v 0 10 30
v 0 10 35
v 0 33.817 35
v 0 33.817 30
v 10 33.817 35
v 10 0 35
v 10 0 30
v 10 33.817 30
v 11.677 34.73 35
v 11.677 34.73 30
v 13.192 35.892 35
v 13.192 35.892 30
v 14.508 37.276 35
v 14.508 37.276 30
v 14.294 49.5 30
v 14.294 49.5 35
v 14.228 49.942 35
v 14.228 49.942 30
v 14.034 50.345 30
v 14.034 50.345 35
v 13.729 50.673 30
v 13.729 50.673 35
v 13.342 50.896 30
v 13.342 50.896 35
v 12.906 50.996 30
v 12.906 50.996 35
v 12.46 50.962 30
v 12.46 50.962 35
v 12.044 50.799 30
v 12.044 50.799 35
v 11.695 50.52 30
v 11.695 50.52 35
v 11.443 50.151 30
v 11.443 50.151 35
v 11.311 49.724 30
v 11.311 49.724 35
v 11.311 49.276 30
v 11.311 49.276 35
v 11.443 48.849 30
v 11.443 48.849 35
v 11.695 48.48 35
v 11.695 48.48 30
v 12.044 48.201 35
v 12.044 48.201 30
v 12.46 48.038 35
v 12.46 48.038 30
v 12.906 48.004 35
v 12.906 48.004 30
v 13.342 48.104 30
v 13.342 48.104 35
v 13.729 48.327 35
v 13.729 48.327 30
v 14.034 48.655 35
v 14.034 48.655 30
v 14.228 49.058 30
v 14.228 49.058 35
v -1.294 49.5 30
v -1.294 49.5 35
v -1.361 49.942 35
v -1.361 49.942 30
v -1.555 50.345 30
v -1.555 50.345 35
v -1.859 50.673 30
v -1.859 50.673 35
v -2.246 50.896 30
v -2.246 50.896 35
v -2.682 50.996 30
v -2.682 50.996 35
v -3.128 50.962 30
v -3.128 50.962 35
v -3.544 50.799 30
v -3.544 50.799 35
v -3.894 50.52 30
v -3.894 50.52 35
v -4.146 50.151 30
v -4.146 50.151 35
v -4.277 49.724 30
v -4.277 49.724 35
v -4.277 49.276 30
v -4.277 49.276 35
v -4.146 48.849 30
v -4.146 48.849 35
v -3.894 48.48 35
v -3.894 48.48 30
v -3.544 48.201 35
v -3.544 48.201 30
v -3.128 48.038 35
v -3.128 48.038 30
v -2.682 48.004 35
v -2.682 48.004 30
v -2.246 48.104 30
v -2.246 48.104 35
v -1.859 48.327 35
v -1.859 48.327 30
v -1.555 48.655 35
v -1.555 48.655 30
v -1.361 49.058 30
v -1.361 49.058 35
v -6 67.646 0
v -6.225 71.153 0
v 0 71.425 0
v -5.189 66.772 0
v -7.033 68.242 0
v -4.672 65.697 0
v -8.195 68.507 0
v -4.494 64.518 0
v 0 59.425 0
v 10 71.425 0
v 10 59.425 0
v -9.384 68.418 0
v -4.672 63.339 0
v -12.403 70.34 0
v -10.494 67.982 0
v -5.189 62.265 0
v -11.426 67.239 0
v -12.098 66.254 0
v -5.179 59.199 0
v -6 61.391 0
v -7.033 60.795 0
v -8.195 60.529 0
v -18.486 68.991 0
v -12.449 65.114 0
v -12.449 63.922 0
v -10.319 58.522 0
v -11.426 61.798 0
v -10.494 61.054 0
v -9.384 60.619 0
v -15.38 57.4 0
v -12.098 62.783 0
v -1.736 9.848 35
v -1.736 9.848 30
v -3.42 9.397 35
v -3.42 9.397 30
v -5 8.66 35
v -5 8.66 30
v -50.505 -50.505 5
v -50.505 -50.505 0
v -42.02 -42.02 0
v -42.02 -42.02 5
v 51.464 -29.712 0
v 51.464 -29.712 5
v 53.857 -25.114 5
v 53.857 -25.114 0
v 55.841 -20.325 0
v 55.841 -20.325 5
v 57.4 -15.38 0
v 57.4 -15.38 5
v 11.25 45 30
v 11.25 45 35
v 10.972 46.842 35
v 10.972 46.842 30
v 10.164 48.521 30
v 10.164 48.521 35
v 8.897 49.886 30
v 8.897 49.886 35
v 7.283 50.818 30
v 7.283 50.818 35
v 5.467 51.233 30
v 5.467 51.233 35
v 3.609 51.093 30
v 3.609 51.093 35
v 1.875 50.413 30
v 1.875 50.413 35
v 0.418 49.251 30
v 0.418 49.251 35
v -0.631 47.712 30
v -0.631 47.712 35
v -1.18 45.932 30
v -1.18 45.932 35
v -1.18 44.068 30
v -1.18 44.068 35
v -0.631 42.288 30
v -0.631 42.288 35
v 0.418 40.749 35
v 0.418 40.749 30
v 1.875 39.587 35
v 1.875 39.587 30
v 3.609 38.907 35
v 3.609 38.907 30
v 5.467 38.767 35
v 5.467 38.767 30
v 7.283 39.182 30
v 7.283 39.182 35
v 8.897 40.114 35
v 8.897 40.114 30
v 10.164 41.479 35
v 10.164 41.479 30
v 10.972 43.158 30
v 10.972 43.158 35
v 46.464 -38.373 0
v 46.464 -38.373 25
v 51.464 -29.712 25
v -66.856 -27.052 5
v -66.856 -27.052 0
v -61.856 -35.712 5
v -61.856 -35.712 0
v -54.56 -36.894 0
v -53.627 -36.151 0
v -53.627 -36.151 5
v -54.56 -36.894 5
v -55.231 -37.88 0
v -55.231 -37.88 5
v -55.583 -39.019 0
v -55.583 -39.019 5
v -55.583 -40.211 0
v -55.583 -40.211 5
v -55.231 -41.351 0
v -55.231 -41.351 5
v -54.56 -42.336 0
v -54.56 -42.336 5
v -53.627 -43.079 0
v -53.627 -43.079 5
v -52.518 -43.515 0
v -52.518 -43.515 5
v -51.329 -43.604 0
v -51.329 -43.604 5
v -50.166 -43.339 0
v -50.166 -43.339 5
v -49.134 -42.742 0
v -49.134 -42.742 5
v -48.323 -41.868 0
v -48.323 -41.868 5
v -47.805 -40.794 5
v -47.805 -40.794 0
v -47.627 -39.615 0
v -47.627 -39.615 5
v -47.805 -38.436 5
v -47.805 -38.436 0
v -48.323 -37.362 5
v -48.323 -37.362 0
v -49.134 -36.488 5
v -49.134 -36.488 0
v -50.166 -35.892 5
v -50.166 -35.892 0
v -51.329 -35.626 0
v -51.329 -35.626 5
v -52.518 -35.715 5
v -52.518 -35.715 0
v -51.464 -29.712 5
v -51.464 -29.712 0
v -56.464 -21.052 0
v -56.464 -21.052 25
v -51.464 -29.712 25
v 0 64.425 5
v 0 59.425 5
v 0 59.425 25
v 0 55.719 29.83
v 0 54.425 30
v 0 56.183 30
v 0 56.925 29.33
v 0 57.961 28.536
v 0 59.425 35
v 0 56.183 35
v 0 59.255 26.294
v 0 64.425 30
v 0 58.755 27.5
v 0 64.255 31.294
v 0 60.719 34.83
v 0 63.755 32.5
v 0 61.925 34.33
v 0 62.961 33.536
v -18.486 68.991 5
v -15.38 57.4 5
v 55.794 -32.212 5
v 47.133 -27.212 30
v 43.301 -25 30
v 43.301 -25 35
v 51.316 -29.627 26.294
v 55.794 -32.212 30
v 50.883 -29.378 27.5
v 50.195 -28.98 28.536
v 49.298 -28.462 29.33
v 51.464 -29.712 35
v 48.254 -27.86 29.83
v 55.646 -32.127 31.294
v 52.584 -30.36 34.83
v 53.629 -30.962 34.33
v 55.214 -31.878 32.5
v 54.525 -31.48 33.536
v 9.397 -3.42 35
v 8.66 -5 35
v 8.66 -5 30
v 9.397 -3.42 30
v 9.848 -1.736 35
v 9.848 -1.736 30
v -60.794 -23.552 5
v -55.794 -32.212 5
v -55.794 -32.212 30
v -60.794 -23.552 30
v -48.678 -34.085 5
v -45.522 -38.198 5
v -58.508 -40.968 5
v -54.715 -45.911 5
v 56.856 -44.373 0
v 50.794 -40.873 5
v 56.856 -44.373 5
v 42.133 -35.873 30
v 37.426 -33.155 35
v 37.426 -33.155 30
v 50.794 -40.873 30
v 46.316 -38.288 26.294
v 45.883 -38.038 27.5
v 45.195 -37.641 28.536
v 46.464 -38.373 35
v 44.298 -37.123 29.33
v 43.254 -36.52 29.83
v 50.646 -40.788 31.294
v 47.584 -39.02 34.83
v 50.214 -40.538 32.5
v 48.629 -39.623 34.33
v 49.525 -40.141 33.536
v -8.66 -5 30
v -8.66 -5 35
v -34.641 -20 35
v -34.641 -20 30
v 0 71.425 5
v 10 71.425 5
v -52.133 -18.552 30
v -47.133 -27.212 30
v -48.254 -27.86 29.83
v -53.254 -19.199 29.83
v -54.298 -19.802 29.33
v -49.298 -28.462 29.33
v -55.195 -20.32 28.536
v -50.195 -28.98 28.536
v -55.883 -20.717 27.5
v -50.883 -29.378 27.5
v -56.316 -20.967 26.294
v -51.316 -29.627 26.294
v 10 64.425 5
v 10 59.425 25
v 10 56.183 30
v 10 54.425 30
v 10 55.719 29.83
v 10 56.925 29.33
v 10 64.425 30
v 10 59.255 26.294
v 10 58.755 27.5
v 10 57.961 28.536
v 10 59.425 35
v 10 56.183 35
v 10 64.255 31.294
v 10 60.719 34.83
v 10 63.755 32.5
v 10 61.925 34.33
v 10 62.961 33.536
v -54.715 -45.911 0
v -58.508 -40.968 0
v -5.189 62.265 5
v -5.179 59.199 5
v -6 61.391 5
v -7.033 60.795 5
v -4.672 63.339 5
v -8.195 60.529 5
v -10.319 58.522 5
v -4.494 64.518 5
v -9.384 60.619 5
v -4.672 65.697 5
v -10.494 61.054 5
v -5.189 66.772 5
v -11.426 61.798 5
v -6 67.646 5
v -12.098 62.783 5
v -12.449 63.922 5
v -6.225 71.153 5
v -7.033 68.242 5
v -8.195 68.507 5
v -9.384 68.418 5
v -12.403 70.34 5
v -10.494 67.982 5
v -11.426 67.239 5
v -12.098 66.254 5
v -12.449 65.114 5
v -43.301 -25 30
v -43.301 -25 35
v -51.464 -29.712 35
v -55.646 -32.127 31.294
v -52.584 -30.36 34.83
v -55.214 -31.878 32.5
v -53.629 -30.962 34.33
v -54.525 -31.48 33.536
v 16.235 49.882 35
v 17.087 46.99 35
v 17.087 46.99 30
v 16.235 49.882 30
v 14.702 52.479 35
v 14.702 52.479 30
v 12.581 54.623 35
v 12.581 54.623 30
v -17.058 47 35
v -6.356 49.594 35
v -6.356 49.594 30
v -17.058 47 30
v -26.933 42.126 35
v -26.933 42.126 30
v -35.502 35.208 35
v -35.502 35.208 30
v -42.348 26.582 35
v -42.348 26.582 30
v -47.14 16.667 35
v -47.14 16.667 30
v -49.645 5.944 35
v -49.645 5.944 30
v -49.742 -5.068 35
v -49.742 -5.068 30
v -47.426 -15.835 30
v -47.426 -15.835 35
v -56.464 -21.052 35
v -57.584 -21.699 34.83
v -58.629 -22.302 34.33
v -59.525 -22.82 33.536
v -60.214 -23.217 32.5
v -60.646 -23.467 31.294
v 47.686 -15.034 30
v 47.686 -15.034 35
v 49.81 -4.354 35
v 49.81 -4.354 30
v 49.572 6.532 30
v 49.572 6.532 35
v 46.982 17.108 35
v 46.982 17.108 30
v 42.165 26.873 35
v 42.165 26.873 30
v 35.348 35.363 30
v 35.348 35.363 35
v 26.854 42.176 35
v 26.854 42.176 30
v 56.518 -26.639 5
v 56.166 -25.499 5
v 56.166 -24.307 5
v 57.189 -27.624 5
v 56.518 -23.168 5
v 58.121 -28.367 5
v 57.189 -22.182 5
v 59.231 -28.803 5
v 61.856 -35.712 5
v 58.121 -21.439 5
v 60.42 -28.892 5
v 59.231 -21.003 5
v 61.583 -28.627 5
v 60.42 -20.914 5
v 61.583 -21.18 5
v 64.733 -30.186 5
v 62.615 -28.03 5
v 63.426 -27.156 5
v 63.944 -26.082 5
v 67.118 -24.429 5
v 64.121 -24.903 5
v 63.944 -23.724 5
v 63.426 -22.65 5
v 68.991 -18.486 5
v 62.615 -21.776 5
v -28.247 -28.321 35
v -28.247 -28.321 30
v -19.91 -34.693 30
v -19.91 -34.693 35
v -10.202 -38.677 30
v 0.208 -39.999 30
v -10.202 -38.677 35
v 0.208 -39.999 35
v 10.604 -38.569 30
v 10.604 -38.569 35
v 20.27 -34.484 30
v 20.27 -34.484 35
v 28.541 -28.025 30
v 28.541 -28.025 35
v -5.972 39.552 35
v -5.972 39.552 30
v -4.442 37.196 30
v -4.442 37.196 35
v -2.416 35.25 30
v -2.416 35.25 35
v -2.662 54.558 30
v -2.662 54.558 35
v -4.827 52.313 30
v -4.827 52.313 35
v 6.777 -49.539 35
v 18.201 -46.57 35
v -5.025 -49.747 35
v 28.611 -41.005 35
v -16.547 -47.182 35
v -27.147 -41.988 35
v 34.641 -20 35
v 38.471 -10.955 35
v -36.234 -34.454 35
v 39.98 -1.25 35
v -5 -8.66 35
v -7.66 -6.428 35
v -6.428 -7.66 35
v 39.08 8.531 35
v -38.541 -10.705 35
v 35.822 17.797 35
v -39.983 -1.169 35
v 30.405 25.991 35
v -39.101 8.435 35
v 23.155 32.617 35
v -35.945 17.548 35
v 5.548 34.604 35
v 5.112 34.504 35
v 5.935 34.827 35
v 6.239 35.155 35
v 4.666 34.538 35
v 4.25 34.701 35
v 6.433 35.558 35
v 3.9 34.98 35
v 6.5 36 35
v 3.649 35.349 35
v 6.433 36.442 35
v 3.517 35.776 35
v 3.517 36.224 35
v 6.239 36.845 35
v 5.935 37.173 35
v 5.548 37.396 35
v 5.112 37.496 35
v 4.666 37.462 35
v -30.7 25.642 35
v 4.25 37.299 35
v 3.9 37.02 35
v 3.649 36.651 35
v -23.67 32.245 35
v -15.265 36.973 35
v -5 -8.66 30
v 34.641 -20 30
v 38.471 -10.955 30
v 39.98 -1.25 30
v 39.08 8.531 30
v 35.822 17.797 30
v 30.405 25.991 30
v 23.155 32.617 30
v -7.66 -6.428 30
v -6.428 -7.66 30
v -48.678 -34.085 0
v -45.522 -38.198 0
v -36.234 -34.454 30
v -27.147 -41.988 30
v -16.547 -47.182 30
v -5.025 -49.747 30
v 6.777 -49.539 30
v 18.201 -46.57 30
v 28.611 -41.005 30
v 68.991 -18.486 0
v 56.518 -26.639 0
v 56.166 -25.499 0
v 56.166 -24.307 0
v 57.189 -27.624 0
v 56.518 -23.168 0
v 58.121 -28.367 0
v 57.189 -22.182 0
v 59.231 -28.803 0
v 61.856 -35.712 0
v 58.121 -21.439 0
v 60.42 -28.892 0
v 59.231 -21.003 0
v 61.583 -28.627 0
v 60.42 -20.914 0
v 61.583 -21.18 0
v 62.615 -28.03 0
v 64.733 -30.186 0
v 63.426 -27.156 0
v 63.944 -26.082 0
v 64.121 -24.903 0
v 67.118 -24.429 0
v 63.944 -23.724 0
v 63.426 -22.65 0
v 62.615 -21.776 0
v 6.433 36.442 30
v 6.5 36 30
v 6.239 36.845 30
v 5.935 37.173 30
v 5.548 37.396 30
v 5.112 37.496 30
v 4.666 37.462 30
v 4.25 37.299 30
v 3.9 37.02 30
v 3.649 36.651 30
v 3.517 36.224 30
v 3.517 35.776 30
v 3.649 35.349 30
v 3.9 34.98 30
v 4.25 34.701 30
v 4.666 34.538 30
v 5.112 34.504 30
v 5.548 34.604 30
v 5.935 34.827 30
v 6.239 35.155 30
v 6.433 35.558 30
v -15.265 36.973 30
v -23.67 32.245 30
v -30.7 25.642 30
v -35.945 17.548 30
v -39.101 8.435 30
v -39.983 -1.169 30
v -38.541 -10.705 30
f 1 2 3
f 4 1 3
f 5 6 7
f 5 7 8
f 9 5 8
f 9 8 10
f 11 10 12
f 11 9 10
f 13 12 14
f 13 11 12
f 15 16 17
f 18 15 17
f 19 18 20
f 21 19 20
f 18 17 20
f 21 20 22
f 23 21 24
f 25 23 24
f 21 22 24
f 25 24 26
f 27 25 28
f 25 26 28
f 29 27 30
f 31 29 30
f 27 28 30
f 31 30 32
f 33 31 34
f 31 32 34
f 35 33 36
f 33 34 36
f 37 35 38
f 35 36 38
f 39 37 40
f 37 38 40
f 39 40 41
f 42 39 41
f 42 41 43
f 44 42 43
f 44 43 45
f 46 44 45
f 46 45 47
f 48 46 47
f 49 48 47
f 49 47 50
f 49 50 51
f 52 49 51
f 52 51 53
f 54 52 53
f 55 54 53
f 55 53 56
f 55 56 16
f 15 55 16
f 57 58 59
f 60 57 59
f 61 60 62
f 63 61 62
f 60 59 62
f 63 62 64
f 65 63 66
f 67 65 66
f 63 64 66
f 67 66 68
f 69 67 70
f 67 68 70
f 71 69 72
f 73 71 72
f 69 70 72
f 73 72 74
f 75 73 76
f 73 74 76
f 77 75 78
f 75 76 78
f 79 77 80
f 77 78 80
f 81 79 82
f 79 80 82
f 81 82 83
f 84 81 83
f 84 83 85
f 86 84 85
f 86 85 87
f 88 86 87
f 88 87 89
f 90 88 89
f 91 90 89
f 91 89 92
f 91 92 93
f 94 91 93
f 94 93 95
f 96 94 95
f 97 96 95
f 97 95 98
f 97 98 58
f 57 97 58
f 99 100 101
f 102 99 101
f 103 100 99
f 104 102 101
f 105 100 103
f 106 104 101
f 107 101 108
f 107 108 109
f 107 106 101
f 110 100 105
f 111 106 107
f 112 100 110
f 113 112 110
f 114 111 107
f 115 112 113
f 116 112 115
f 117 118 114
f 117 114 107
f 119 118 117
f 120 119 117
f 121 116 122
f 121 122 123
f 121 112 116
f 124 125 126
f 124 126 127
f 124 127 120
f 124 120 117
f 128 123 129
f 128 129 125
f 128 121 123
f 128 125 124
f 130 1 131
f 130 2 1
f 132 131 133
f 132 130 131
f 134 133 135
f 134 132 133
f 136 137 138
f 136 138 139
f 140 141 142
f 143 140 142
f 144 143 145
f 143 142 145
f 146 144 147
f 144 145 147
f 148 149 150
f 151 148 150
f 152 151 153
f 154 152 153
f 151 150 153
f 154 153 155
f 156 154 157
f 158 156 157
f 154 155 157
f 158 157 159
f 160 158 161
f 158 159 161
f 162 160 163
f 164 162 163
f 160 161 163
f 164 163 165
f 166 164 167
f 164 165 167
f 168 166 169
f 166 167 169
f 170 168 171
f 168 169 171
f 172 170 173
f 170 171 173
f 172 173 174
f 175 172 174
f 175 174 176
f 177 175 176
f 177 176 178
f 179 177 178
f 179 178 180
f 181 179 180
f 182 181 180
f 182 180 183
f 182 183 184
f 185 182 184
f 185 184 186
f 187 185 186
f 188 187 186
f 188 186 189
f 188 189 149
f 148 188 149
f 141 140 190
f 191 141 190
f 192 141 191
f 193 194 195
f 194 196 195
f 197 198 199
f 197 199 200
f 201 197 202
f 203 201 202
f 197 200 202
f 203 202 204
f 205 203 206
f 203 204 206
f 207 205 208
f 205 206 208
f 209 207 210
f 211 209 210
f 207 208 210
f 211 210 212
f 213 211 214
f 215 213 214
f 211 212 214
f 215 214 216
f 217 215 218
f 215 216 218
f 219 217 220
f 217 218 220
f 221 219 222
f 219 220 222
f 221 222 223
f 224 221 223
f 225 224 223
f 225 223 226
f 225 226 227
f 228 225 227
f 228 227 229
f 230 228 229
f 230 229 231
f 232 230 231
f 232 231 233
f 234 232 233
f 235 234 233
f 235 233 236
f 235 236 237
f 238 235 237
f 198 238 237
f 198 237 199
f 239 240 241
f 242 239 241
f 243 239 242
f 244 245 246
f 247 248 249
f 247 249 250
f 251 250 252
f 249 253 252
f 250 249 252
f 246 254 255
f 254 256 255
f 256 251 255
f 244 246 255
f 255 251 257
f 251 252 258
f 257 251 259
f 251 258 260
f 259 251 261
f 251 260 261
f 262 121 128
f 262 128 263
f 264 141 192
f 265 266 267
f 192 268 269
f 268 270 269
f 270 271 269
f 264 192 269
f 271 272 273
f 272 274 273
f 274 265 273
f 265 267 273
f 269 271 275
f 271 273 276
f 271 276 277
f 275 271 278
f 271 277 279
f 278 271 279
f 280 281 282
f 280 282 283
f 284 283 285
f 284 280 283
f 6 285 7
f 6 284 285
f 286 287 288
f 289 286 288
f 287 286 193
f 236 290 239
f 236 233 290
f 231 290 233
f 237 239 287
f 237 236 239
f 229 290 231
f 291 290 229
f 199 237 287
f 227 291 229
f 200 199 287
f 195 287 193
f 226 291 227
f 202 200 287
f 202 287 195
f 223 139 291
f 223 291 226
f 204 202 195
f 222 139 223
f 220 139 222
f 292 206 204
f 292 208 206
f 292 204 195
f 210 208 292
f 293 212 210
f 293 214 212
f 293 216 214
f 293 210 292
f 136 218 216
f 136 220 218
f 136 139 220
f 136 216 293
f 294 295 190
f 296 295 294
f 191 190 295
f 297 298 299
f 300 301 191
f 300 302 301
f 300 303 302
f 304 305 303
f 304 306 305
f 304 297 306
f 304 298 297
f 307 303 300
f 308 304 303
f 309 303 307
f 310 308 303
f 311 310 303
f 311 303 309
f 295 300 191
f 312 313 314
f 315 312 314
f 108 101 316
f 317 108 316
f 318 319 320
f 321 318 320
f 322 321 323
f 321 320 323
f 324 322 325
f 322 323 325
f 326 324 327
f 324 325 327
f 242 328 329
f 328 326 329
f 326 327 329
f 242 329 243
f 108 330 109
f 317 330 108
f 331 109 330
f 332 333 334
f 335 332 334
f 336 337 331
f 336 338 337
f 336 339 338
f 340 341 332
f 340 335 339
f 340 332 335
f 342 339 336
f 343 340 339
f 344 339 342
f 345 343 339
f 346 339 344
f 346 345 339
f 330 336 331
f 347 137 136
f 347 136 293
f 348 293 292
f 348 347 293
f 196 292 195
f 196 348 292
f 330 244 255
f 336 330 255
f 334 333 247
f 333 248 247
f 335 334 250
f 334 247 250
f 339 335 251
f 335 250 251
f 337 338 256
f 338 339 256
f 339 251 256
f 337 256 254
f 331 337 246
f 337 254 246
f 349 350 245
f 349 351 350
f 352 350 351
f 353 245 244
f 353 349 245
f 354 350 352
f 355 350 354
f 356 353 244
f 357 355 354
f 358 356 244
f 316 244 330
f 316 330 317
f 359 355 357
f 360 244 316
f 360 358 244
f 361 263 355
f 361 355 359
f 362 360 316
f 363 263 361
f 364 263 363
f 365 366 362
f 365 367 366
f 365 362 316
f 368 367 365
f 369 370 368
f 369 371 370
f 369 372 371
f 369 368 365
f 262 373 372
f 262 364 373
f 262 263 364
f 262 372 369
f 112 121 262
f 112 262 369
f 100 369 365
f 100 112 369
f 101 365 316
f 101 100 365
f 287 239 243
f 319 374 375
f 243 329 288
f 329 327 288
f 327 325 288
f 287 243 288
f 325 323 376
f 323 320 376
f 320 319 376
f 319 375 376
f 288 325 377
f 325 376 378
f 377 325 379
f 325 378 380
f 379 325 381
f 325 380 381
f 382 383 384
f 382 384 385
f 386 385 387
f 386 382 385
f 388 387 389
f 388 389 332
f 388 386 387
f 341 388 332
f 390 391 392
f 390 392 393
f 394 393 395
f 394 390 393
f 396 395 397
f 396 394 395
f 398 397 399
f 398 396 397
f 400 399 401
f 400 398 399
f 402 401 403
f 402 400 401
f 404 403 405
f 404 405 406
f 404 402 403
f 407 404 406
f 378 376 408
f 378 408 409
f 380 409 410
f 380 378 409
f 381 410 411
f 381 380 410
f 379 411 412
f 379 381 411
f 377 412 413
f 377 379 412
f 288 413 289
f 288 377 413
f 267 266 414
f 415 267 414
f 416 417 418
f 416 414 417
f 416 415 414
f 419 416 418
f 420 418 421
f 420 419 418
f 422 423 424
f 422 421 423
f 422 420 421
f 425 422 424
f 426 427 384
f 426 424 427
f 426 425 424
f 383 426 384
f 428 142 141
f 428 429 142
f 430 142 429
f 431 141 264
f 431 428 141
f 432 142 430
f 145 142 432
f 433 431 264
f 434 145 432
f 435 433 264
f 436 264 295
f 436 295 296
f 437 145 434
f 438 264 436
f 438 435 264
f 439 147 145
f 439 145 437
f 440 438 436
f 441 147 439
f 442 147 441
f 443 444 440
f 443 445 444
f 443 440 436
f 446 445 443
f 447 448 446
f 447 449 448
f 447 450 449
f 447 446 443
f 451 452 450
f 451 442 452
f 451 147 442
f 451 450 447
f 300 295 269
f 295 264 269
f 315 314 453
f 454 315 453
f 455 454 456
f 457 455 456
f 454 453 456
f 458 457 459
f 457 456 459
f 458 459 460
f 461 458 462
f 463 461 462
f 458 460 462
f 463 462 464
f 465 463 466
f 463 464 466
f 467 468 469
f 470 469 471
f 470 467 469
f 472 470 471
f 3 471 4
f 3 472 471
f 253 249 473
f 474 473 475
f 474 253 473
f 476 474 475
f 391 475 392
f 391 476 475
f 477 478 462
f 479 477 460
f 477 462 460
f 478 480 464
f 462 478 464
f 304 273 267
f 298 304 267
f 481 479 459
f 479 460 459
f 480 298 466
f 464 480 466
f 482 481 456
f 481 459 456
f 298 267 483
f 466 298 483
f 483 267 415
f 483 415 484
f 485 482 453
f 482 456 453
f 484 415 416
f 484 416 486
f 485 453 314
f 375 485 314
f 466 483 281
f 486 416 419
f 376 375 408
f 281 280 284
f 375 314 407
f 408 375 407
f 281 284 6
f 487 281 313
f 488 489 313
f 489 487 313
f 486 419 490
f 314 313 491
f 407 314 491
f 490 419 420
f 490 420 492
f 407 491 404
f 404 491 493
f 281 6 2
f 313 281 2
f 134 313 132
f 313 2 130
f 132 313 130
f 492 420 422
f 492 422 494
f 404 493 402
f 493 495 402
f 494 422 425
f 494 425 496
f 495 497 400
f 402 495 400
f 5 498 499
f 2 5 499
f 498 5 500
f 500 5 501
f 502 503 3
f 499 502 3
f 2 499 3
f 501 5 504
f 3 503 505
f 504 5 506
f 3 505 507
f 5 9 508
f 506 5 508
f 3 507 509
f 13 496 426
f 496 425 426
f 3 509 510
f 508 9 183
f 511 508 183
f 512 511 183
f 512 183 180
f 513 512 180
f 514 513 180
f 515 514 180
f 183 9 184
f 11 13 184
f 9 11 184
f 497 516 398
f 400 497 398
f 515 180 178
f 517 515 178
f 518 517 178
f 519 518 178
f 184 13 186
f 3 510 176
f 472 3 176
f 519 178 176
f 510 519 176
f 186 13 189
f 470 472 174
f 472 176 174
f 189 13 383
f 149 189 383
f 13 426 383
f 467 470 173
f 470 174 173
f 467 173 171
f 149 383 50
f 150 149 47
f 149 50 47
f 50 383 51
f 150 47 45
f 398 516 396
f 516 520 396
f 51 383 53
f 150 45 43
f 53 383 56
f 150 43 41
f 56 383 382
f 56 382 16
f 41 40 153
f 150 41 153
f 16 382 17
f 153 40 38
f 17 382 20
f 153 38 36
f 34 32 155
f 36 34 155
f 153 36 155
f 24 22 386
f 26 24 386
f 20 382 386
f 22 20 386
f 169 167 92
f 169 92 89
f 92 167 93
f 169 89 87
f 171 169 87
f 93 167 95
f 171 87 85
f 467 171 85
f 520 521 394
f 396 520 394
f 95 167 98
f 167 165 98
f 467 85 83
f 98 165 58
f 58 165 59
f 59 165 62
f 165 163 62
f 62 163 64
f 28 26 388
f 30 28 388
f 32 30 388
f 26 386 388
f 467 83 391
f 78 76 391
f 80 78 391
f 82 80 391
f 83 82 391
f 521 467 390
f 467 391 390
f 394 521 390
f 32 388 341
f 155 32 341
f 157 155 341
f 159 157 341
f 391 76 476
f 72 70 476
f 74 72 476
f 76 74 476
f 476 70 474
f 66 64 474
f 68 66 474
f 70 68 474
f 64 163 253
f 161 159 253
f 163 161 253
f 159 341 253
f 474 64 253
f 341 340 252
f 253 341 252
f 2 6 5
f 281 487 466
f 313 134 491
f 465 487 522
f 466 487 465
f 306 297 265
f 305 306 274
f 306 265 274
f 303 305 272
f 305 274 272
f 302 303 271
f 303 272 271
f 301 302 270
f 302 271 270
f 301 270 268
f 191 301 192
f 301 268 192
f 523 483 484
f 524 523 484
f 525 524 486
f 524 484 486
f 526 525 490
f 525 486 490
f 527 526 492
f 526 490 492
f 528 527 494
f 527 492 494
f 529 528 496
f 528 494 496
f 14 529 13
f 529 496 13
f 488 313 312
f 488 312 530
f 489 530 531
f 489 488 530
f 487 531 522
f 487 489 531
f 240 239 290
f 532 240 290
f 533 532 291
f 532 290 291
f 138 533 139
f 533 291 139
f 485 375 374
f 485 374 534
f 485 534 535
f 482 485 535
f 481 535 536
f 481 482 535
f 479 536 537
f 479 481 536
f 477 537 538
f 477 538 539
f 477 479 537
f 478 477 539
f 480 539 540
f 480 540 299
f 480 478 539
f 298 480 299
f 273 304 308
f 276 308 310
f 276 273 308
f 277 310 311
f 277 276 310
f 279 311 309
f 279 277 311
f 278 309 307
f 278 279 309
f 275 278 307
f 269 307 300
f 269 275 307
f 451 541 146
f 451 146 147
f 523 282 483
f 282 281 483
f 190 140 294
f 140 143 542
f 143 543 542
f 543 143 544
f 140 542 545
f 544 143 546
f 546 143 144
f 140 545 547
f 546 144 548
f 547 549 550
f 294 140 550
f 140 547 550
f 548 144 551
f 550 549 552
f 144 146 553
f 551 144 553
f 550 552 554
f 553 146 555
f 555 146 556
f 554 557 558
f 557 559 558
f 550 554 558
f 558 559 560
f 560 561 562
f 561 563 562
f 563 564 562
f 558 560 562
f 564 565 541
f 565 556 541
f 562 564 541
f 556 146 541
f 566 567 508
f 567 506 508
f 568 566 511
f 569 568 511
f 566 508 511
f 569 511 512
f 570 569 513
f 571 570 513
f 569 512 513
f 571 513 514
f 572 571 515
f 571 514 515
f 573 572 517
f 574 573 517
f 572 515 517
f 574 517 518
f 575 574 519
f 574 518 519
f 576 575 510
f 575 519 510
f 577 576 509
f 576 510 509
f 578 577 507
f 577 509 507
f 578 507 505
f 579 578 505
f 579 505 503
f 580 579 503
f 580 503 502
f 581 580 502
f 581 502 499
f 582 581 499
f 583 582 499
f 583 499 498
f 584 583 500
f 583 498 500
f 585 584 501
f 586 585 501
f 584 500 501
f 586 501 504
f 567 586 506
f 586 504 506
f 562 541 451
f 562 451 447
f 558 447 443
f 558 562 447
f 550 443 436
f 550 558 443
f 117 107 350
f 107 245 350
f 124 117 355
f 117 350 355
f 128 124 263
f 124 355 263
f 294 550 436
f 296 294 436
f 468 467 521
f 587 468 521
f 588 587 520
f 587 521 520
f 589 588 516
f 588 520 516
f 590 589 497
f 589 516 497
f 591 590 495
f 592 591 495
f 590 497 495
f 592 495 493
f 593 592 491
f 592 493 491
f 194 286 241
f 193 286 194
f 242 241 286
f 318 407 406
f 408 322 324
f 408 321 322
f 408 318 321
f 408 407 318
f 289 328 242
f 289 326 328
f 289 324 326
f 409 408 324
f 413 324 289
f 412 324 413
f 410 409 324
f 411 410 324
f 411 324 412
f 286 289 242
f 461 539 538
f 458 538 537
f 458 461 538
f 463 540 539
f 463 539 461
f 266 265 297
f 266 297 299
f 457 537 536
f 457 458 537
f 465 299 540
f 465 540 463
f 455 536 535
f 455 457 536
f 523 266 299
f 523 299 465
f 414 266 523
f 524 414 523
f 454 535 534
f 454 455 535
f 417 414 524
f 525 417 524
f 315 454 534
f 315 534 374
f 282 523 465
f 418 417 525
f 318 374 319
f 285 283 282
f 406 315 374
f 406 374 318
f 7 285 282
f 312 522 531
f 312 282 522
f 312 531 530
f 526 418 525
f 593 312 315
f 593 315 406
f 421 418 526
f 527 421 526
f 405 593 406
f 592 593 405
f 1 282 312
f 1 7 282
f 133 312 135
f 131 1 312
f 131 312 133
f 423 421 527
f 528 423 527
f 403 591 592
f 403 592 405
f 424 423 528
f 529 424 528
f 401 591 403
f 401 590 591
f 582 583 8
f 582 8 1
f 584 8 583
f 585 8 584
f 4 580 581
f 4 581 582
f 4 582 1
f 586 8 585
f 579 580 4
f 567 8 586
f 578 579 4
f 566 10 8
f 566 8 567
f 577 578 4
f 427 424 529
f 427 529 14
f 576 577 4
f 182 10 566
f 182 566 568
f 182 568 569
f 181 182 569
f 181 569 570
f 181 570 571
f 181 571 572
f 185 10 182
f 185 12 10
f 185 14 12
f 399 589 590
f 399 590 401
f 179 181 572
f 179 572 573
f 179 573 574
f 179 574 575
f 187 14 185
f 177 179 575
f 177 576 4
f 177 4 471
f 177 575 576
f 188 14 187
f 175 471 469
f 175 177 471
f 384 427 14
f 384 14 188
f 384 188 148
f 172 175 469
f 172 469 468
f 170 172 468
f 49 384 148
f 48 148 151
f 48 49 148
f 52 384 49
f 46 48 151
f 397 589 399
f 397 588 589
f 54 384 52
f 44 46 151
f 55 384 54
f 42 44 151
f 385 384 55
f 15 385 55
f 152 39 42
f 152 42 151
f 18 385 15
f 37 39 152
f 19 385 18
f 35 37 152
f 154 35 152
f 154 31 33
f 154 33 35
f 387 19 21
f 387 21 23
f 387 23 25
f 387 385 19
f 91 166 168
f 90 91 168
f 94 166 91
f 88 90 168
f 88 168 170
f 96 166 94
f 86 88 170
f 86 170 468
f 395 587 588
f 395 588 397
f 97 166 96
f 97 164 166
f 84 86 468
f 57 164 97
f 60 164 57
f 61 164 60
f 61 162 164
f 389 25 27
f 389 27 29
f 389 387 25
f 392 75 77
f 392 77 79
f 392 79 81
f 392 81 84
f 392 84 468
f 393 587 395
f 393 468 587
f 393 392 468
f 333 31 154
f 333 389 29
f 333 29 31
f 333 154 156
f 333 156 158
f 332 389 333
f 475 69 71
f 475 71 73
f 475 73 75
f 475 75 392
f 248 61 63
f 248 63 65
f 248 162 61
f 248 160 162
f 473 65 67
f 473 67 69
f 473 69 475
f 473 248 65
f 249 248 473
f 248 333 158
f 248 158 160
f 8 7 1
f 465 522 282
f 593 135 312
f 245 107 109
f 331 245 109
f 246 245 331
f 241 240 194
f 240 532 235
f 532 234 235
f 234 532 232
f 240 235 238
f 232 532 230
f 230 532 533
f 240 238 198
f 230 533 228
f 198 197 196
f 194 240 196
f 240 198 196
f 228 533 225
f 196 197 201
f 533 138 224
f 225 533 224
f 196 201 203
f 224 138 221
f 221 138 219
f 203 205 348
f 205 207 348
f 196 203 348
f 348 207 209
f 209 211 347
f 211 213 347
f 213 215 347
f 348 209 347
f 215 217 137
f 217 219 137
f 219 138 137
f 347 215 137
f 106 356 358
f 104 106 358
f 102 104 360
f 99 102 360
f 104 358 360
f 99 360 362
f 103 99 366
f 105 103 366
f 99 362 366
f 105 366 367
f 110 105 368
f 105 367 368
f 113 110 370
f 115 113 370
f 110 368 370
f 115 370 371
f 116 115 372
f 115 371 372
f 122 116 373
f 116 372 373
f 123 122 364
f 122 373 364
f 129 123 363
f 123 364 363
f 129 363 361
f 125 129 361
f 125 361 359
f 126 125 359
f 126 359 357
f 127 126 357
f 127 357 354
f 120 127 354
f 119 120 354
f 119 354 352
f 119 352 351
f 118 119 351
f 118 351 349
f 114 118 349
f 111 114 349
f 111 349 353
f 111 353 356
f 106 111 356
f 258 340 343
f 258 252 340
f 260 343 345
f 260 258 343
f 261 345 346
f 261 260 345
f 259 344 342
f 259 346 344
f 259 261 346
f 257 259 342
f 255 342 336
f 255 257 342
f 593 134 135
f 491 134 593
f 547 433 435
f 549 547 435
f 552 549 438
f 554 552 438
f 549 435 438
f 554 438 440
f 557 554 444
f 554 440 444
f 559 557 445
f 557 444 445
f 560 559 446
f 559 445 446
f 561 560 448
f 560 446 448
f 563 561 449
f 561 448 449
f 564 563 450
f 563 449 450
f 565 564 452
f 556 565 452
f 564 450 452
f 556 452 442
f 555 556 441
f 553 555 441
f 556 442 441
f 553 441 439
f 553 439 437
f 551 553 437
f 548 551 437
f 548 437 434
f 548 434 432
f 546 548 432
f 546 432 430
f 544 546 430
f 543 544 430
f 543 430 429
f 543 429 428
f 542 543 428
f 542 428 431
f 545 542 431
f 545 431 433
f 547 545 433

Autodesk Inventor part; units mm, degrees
ref_plane "YZ Plane" through (0, 0, 0) normal (1, 0, 0) x (0, 1, 0)
ref_plane "XZ Plane" through (0, 0, 0) normal (0, 1, 0) x (-1, 0, 0)
ref_plane "XY Plane" through (0, 0, 0) normal (0, 0, 1) x (1, 0, 0)
sketch "Sketch1" plane through (0, 0, 0) normal (0, 0, 1) x (1, 0, 0)
  circle A0 centre (0, 0) radius 59.425
  circle A1 centre (0, 0) radius 71.425
  line L0 (0, 0) -> (0, 59.425) construction
  line L1 (0, 71.425) -> (0, 59.425) construction
  circle A2 centre (0, 0) radius 65.075
  dimension "d0" = 118.85
  dimension "d2" = 12
  dimension "d12" = 130.15
sketch "Sketch2" plane through (0, 0, 0) normal (1, 0, 0) x (0, 1, 0)
  line L0 (59.425, 0) -> (59.425, 25)
  line L1 (54.425, 30) -> (0, 30)
  line L2 (59.425, 35) -> (0, 35)
  line L3 (0, 35) -> (0, 30)
  line L4 (71.425, 0) -> (71.425, 5)
  line L5 (71.425, 5) -> (64.425, 5)
  line L6 (64.425, 5) -> (64.425, 30)
  arc A0 (64.425, 30) -> (59.425, 35) centre (59.425, 30) ccw
  arc A1 (59.425, 25) -> (54.425, 30) centre (54.425, 25) ccw
  line L7 (71.425, 0) -> (59.425, 0)
  point P0 (0, 0)
  dimension "d3" = 5
  dimension "d5" = 30
  dimension "d6" = 5
  dimension "d7" = 5
  dimension "d8" = 5
extrude "Extrusion2" add sketch "Sketch2" along normal blind 10
sketch "Sketch5" plane through (0, 0, 0) normal (-1, 0, 0) x (0, 0, 1)
  line L0 (5, 71.425) -> (0, 71.425)
  line L1 (0, 71.425) -> (0, 59.425)
  line L2 (0, 59.425) -> (5, 59.425)
  line L3 (5, 59.425) -> (5, 71.425)
  line L4 (-7, 0) -> (42, 0) projected
  point P0 (0, 0)
revolve "Revolution1" add sketch "Sketch5" angle 15 about axis through (0, 0, -10) along (0, 0, 1)
sketch "Sketch6" plane through (0, 64.425, 5) normal (0, 0, 1) x (1, 0, 0)
  circle A0 centre (0, -64.425) radius 65.075 construction
  circle A1 centre (-8.494, 0.0933) radius 4
  line L0 (-8.494, 0.0933) -> (0, 7) construction
  line L1 (-18.4862, 4.5663) -> (-8.494, 0.0933) construction
  dimension "d17" = 8
extrude "Extrusion3" cut sketch "Sketch6" against normal blind 10
pattern_circular "Circular Pattern1" count 3 over 360 about axis through (0, 0, -10) along (0, 0, 1) of "Extrusion2", "Revolution1", "Extrusion3"
sketch "Sketch7" plane through (0, 59.425, 35) normal (0, 0, 1) x (1, 0, 0)
  circle A0 centre (0, -59.425) radius 50
  circle A1 centre (0, -59.425) radius 40
  circle A2 centre (0, -59.425) radius 65.075 projected
  circle A3 centre (0, -59.425) radius 10
  point P0 (-5, -50.7647)
  dimension "d23" = 100
  dimension "d24" = 80
extrude "Extrusion4" add sketch "Sketch7" against normal blind 5 contours A0 | A3
sketch "Sketch8" plane through (0, 59.425, 35) normal (0, 0, 1) x (1, 0, 0)
  circle A0 centre (5, -14.425) radius 6.25
  line L0 (0, -19.425) -> (0, -49.425) projected
  circle A1 centre (5, -14.425) radius 12.25
  circle A2 centre (-2.7942, -9.925) radius 1.5
  circle A3 centre (5, -23.425) radius 1.5
  circle A4 centre (12.7942, -9.925) radius 1.5
  circle A5 centre (5, -14.425) radius 9 construction
  line L1 (5, -23.425) -> (-2.7942, -9.925) construction
  line L2 (12.7942, -9.925) -> (-2.7942, -9.925) construction
  line L3 (5, -23.425) -> (12.7942, -9.925) construction
  point P0 (0, -59.425)
  dimension "d27" = 12.5
  dimension "d28" = 5
  dimension "d29" = 45
  dimension "d32" = 6
  dimension "d35" = 3
  dimension "d36" = 3
  dimension "d37" = 3
  dimension "d38" = 18
extrude "Extrusion6" add sketch "Sketch8" against normal blind 5 contours A1 | A2 | A3 | A4
extrude "Extrusion5" cut sketch "Sketch8" against normal blind 5 contours A0 | A2 | A3 | A4
properties part number "Return_Spool_Mount_2"
